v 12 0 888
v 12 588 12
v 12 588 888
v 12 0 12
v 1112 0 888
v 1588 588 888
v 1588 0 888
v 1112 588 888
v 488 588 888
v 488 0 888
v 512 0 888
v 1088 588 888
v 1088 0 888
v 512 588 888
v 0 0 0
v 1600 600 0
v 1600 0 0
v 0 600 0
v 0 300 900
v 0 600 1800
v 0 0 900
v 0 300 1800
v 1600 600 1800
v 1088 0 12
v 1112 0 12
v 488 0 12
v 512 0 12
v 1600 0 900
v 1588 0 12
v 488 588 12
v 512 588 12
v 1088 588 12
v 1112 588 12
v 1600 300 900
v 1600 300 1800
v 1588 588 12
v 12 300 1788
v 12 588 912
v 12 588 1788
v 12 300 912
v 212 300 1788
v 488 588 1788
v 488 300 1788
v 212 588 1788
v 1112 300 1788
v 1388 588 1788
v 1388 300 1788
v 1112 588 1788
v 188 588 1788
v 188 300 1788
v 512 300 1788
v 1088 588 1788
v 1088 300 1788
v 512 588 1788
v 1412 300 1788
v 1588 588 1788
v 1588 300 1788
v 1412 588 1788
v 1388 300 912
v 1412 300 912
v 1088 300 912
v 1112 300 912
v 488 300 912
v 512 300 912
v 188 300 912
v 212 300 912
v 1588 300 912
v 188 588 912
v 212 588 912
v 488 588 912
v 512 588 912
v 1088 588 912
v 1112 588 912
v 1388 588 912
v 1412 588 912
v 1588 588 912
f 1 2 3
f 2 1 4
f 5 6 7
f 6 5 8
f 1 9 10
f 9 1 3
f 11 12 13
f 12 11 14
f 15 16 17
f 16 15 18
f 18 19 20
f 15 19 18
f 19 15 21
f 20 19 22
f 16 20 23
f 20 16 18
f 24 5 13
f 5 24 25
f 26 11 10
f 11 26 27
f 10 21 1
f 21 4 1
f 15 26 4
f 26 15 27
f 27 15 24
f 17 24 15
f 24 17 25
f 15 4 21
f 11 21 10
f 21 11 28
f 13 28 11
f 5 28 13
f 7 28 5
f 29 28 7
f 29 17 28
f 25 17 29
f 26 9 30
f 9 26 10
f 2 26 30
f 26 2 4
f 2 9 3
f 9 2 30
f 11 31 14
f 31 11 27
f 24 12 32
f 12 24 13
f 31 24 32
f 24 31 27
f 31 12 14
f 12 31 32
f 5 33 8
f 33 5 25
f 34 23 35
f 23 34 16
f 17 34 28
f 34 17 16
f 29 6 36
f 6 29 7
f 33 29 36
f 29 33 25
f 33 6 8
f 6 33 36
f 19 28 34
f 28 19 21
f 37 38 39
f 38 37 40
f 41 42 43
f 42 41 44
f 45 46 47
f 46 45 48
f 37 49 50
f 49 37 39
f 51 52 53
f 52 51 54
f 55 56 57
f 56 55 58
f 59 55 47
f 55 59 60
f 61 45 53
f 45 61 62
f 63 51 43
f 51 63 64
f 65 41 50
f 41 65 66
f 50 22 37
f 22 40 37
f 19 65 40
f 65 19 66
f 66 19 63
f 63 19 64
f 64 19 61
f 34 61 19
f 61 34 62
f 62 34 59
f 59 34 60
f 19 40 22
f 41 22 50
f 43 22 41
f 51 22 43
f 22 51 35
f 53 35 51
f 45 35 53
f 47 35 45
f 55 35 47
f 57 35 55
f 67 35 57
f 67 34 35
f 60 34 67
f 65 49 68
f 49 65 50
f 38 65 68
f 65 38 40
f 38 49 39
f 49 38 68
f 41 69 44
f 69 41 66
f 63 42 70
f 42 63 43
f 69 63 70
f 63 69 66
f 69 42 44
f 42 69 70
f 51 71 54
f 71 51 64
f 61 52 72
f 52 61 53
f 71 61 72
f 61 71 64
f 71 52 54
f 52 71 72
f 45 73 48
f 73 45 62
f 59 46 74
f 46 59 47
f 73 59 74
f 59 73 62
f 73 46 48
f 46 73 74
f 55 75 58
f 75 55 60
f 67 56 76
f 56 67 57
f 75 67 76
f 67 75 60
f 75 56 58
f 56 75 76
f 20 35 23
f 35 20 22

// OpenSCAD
// file: module/cabinet.scad
/*

    Cabinet
    
    By Anton Augustsson


*/

module cabinet (
    thickness,
    length,
    width,
    height
    ){
/*
    ---------- Local varibles ---------- 
*/



/*
    ---------- Code ---------- 
*/


union () {

// Left
translate([
    0,
    0,
    0]) 
cube(size = [
    thickness,
    width,
    height-thickness]);

// Right
translate([
    length-thickness,
    0,
    0]) 
cube(size = [
    thickness,
    width,
    height-thickness]);
    
// Bottom 
translate([
    thickness,
    0,
    0]) 
cube(size = [
    length
    -thickness*2,
    width-thickness,
    thickness]);

// Back
translate([
    thickness,
    width-thickness,
    0]) 
cube(size = [
    length
    -thickness*2,
    thickness,
    height-thickness]);
}}



/*
    ---------- Example ---------- 
*/


thickness = 12;

length = 600;
width  = 600;
height = 900;

cabinet (
    thickness,
    length,
    width,
    height
    );
// file: module/tird-section-right-cabinet.scad
/*

    Tird Section Right Cabinet
    
    By Anton Augustsson


*/

use <cabinet.scad>;

module tirdSectionRightCabinet (
    plywoodThickness,
    lengthMiddleSection,
    lengthSecondSection,
    length,
    widthCabinet,
    widthCabinetDoor,
    widthTable,
    width,
    heightTable,
    heightCabinet,
    x,y,z
    ){

/*
    ---------- Local varibles ---------- 
*/

thickness = plywoodThickness;

length = lengthTirdSection;
width  = widthCabinet;
height = heightCabinet;


/*
    ---------- Code ---------- 
*/


translate([
	x,
	y,
	z,])

union () {

cabinet (
    thickness,
    length,
    width,
    height
    );

}}



/*
    ---------- Example ---------- 
*/


plywoodThickness = 12;

lengthMiddleSection = 600;
lengthSecondSection = lengthMiddleSection/2;
lengthTirdSection   = 200;
length=lengthMiddleSection
    +lengthSecondSection*2
    +lengthTirdSection*2;

widthCabinet     = 300;
widthCabinetDoor = widthCabinet/3;
widthTable       = 300;
width            = widthCabinet+widthTable;

heightTable   = 900;
heightCabinet = 900;


x=lengthMiddleSection+
    lengthSecondSection*2+lengthTirdSection;
y=width-widthCabinet;
z=heightTable;

tirdSectionRightCabinet (
    plywoodThickness,
    lengthMiddleSection,
    lengthSecondSection,
    length,
    widthCabinet,
    widthCabinetDoor,
    widthTable,
    width,
    heightTable,
    heightCabinet,
    x,y,z
    );
// file: module/tird-section-left-cabinet.scad
/*

    Tird Section Left Cabinet
    
    By Anton Augustsson


*/

use <cabinet.scad>;

module tirdSectionLeftCabinet (
    plywoodThickness,
    lengthMiddleSection,
    lengthSecondSection,
    length,
    widthCabinet,
    widthCabinetDoor,
    widthTable,
    width,
    heightTable,
    heightCabinet,
    x,y,z
    ){

/*
    ---------- Local varibles ---------- 
*/

thickness = plywoodThickness;

length = lengthTirdSection;
width  = widthCabinet;
height = heightCabinet;


/*
    ---------- Code ---------- 
*/


translate([
	x,
	y,
	z,])

union () {

cabinet (
    thickness,
    length,
    width,
    height
    );
    
}}



/*
    ---------- Example ---------- 
*/


plywoodThickness = 12;

lengthMiddleSection = 600;
lengthSecondSection = lengthMiddleSection/2;
lengthTirdSection   = 200;
length=lengthMiddleSection
    +lengthSecondSection*2
    +lengthTirdSection*2;

widthCabinet     = 300;
widthCabinetDoor = widthCabinet/3;
widthTable       = 300;
width            = widthCabinet+widthTable;

heightTable   = 900;
heightCabinet = 900;


x=0;
y=width-widthCabinet;
z=heightTable;

tirdSectionLeftCabinet (
    plywoodThickness,
    lengthMiddleSection,
    lengthSecondSection,
    length,
    widthCabinet,
    widthCabinetDoor,
    widthTable,
    width,
    heightTable,
    heightCabinet,
    x,y,z
    );
// file: module/second-tird-section-right-table.scad
/*

    Second Tird Section Right Table
    
    By Anton Augustsson


*/

use <cabinet.scad>;

module secondTirdSectionRightTable (
    plywoodThickness,
    lengthMiddleSection,
    lengthSecondSection,
    length,
    widthCabinet,
    widthCabinetDoor,
    widthTable,
    width,
    heightTable,
    heightCabinet,
    x,y,z
    ){

/*
    ---------- Local varibles ---------- 
*/

thickness = plywoodThickness;

length = lengthSecondSection+
        lengthTirdSection;
width  = widthTable+widthCabinet;
height = heightTable;


/*
    ---------- Code ---------- 
*/


translate([
	x,
	y,
	z,])

union () {

cabinet (
    thickness,
    length,
    width,
    height
    );

}}



/*
    ---------- Example ---------- 
*/


plywoodThickness = 12;

lengthMiddleSection = 600;
lengthSecondSection = lengthMiddleSection/2;
lengthTirdSection   = 200;
length=lengthMiddleSection
    +lengthSecondSection*2
    +lengthTirdSection*2;

widthCabinet     = 300;
widthCabinetDoor = widthCabinet/3;
widthTable       = 300;
width            = widthCabinet+widthTable;

heightTable   = 900;
heightCabinet = 900;


x=lengthMiddleSection+
    lengthSecondSection+lengthTirdSection;
y=0;
z=0;

secondTirdSectionRightTable (
    plywoodThickness,
    lengthMiddleSection,
    lengthSecondSection,
    length,
    widthCabinet,
    widthCabinetDoor,
    widthTable,
    width,
    heightTable,
    heightCabinet,
    x,y,z
    );
// file: module/second-tird-section-left-table.scad
/*

    Second Tird Section Left Table
    
    By Anton Augustsson


*/

use <cabinet.scad>;

module secondTirdSectionLeftTable (
    plywoodThickness,
    lengthMiddleSection,
    lengthSecondSection,
    length,
    widthCabinet,
    widthCabinetDoor,
    widthTable,
    width,
    heightTable,
    heightCabinet,
    x,y,z
    ){

/*
    ---------- Local varibles ---------- 
*/

thickness = plywoodThickness;

length = lengthSecondSection+
        lengthTirdSection;
width  = widthTable+widthCabinet;
height = heightTable;


/*
    ---------- Code ---------- 
*/


translate([
	x,
	y,
	z,])

union () {

cabinet (
    thickness,
    length,
    width,
    height
    );

}}



/*
    ---------- Example ---------- 
*/


plywoodThickness = 12;

lengthMiddleSection = 600;
lengthSecondSection = lengthMiddleSection/2;
lengthTirdSection   = 200;
length=lengthMiddleSection
    +lengthSecondSection*2
    +lengthTirdSection*2;

widthCabinet     = 300;
widthCabinetDoor = widthCabinet/3;
widthTable       = 300;
width            = widthCabinet+widthTable;

heightTable   = 900;
heightCabinet = 900;


x=0;
y=0;
z=0;

secondTirdSectionLeftTable (
    plywoodThickness,
    lengthMiddleSection,
    lengthSecondSection,
    length,
    widthCabinet,
    widthCabinetDoor,
    widthTable,
    width,
    heightTable,
    heightCabinet,
    x,y,z
    );
// file: module/second-section-right-cabinet.scad
/*

    Second Section Right Cabinet
    
    By Anton Augustsson


*/

use <cabinet.scad>;

module secondSectionRightCabinet (
    plywoodThickness,
    lengthMiddleSection,
    lengthSecondSection,
    length,
    widthCabinet,
    widthCabinetDoor,
    widthTable,
    width,
    heightTable,
    heightCabinet,
    x,y,z
	){

/*
    ---------- Local varibles ---------- 
*/

thickness = plywoodThickness;

length = lengthSecondSection;
width  = widthCabinet;
height = heightCabinet;


/*
    ---------- Code ---------- 
*/


translate([
	x,
	y,
	z,])

union () {

cabinet (
    thickness,
    length,
    width,
    height
    );

}}



/*
    ---------- Example ---------- 
*/


plywoodThickness = 12;

lengthMiddleSection = 600;
lengthSecondSection = lengthMiddleSection/2;
lengthTirdSection   = 200;
length=lengthMiddleSection
    +lengthSecondSection*2
    +lengthTirdSection*2;

widthCabinet     = 300;
widthCabinetDoor = widthCabinet/3;
widthTable       = 300;
width            = widthCabinet+widthTable;

heightTable   = 900;
heightCabinet = 900;


x=lengthMiddleSection+
    lengthSecondSection+lengthTirdSection;
y=width-widthCabinet;
z=heightTable;

secondSectionRightCabinet (
    plywoodThickness,
    lengthMiddleSection,
    lengthSecondSection,
    length,
    widthCabinet,
    widthCabinetDoor,
    widthTable,
    width,
    heightTable,
    heightCabinet,
    x,y,z
    );
// file: module/second-section-left-cabinet.scad
/*

    Second Section Left Cabinet
    
    By Anton Augustsson


*/

use <cabinet.scad>;

module secondSectionLeftCabinet (
    plywoodThickness,
    lengthMiddleSection,
    lengthSecondSection,
    length,
    widthCabinet,
    widthCabinetDoor,
    widthTable,
    width,
    heightTable,
    heightCabinet,
    x,y,z
    ){

/*
    ---------- Local varibles ---------- 
*/

thickness = plywoodThickness;

length = lengthSecondSection;
width  = widthCabinet;
height = heightCabinet;


/*
    ---------- Code ---------- 
*/


translate([
	x,
	y,
	z,])

union () {

cabinet (
    thickness,
    length,
    width,
    height
    );
}}



/*
    ---------- Example ---------- 
*/


plywoodThickness = 12;

lengthMiddleSection = 600;
lengthSecondSection = lengthMiddleSection/2;
lengthTirdSection   = 200;
length=lengthMiddleSection
    +lengthSecondSection*2
    +lengthTirdSection*2;

widthCabinet     = 300;
widthCabinetDoor = widthCabinet/3;
widthTable       = 300;
width            = widthCabinet+widthTable;

heightTable   = 900;
heightCabinet = 900;


x=lengthTirdSection;
y=width-widthCabinet;
z=heightTable;

secondSectionLeftCabinet (
    plywoodThickness,
    lengthMiddleSection,
    lengthSecondSection,
    length,
    widthCabinet,
    widthCabinetDoor,
    widthTable,
    width,
    heightTable,
    heightCabinet,
    x,y,z
    );
// file: module/middle-section-cabinet.scad
/*

    Middle Section Cabinet
    
    By Anton Augustsson


*/

use <cabinet.scad>;

module middleSectionCabinet (
    plywoodThickness,
    lengthMiddleSection,
    lengthSecondSection,
    length,
    widthCabinet,
    widthCabinetDoor,
    widthTable,
    width,
    heightTable,
    heightCabinet,
    x,y,z
    ){
/*
    ---------- Local varibles ---------- 
*/

thickness = plywoodThickness;

length = lengthMiddleSection;
width  = widthCabinet;
height = heightCabinet;


/*
    ---------- Code ---------- 
*/


translate([
	x,
	y,
	z,])

union () {

cabinet (
    thickness,
    length,
    width,
    height
    );
}}



/*
    ---------- Example ---------- 
*/


plywoodThickness = 12;

lengthMiddleSection = 600;
lengthSecondSection = lengthMiddleSection/2;
lengthTirdSection   = 200;
length=lengthMiddleSection
    +lengthSecondSection*2
    +lengthTirdSection*2;

widthCabinet     = 300;
widthCabinetDoor = widthCabinet/3;
widthTable       = 300;
width            = widthCabinet+widthTable;

heightTable   = 900;
heightCabinet = 900;


x=lengthSecondSection+lengthTirdSection;
y=width-widthCabinet;
z=heightTable;

middleSectionCabinet (
    plywoodThickness,
    lengthMiddleSection,
    lengthSecondSection,
    length,
    widthCabinet,
    widthCabinetDoor,
    widthTable,
    width,
    heightTable,
    heightCabinet,
    x,y,z
    );
// file: module/middle-section-table.scad
/*

    Middle Section Table
    
    By Anton Augustsson


*/

use <cabinet.scad>;

module middleSectionTable (
    plywoodThickness,
    lengthMiddleSection,
    lengthSecondSection,
    length,
    widthCabinet,
    widthCabinetDoor,
    widthTable,
    width,
    heightTable,
    heightCabinet,
    x,y,z
    ){

/*
    ---------- Local varibles ---------- 
*/

thickness = plywoodThickness;

length = lengthMiddleSection;
width  = widthTable+widthCabinet;
height = heightTable;


/*
    ---------- Code ---------- 
*/


translate([
	x,
	y,
	z,])

union () {

cabinet (
    thickness,
    length,
    width,
    height
    );
}}



/*
    ---------- Example ---------- 
*/


plywoodThickness = 12;

lengthMiddleSection = 600;
lengthSecondSection = lengthMiddleSection/2;
lengthTirdSection   = 200;
length=lengthMiddleSection
    +lengthSecondSection*2
    +lengthTirdSection*2;

widthCabinet     = 300;
widthCabinetDoor = widthCabinet/3;
widthTable       = 300;
width            = widthCabinet+widthTable;

heightTable   = 900;
heightCabinet = 900;


x=lengthSecondSection+lengthTirdSection;
y=0;
z=0;

middleSectionTable (
    plywoodThickness,
    lengthMiddleSection,
    lengthSecondSection,
    length,
    widthCabinet,
    widthCabinetDoor,
    widthTable,
    width,
    heightTable,
    heightCabinet,
    x,y,z
    );
// main file
/*

    Tool Cabinet
    
    By Anton Augustsson
    
    
*/

use <module/middle-section-table.scad>;
use <module/middle-section-cabinet.scad>;
use <module/second-section-left-cabinet.scad>;
use <module/second-section-right-cabinet.scad>;
use <module/second-tird-section-left-table.scad>;
use <module/second-tird-section-right-table.scad>;
use <module/tird-section-left-cabinet.scad>;
use <module/tird-section-right-cabinet.scad>;

/*
    ---------- Variables ---------- 
*/

plywoodThickness = 12;

lengthMiddleSection = 600;
lengthSecondSection = lengthMiddleSection/2;
lengthTirdSection   = 200;
length=lengthMiddleSection
    +lengthSecondSection*2
    +lengthTirdSection*2;

widthCabinet     = 300;
widthCabinetDoor = widthCabinet/3;
widthTable       = 300;
width            = widthCabinet+widthTable;

heightTable   = 900;
heightCabinet = 900;



/*
    ---------- Code ---------- 
*/



// ---------- Table unit ---------- 
union () {
    
// Left table storageUunit
color("BurlyWood")
secondTirdSectionLeftTable (
    plywoodThickness,
    lengthMiddleSection,
    lengthSecondSection,
    length,
    widthCabinet,
    widthCabinetDoor,
    widthTable,
    width,
    heightTable,
    heightCabinet,
    0,0,0
    );

// middle table storageUunit
color("Tan")
middleSectionTable (
    plywoodThickness,
    lengthMiddleSection,
    lengthSecondSection,
    length,
    widthCabinet,
    widthCabinetDoor,
    widthTable,
    width,
    heightTable,
    heightCabinet,
    lengthSecondSection+lengthTirdSection,
    0,0
    );

// Right table storageUunit
color("BurlyWood")
secondTirdSectionRightTable (
    plywoodThickness,
    lengthMiddleSection,
    lengthSecondSection,
    length,
    widthCabinet,
    widthCabinetDoor,
    widthTable,
    width,
    heightTable,
    heightCabinet,
    lengthMiddleSection+
    lengthSecondSection+lengthTirdSection,
    0,0
    );

// Right table storageUunit
color("Tan")
union () {
translate([
    0,
    0,
    heightTable-plywoodThickness]) 
cube(size = [
    length,
    width,
    plywoodThickness]);
}}



// ---------- Cabinet unit ---------- 

union () {

// Left table storageUunit
color("BurlyWood")
tirdSectionLeftCabinet (
    plywoodThickness,
    lengthMiddleSection,
    lengthSecondSection,
    length,
    widthCabinet,
    widthCabinetDoor,
    widthTable,
    width,
    heightTable,
    heightCabinet,
    0,
    width-widthCabinet,
    heightTable
    );

// Middle Left table storageUunit
color("Tan")
secondSectionLeftCabinet (
    plywoodThickness,
    lengthMiddleSection,
    lengthSecondSection,
    length,
    widthCabinet,
    widthCabinetDoor,
    widthTable,
    width,
    heightTable,
    heightCabinet,
    lengthTirdSection,
    width-widthCabinet,
    heightTable
    );

// Middle storageUnit
color("BurlyWood")
middleSectionCabinet (
    plywoodThickness,
    lengthMiddleSection,
    lengthSecondSection,
    length,
    widthCabinet,
    widthCabinetDoor,
    widthTable,
    width,
    heightTable,
    heightCabinet,
    lengthSecondSection+lengthTirdSection,
    width-widthCabinet,
    heightTable
    );

// Middle Right table storageUunit
color("Tan")
secondSectionRightCabinet (
    plywoodThickness,
    lengthMiddleSection,
    lengthSecondSection,
    length,
    widthCabinet,
    widthCabinetDoor,
    widthTable,
    width,
    heightTable,
    heightCabinet,
    lengthMiddleSection+
    lengthSecondSection+lengthTirdSection,
    width-widthCabinet,
    heightTable
    );
    
// Right table storageUunit
color("BurlyWood")
tirdSectionRightCabinet (
    plywoodThickness,
    lengthMiddleSection,
    lengthSecondSection,
    length,
    widthCabinet,
    widthCabinetDoor,
    widthTable,
    width,
    heightTable,
    heightCabinet,
    lengthMiddleSection+
    lengthSecondSection*2+lengthTirdSection,
    width-widthCabinet,
    heightTable
    );

// Top
color("Tan")
union () {
translate([
    0,
    width-widthCabinet,
    heightTable+heightCabinet
    -plywoodThickness]) 
cube(size = [
    length,
    widthCabinet,
    plywoodThickness]);
}}
